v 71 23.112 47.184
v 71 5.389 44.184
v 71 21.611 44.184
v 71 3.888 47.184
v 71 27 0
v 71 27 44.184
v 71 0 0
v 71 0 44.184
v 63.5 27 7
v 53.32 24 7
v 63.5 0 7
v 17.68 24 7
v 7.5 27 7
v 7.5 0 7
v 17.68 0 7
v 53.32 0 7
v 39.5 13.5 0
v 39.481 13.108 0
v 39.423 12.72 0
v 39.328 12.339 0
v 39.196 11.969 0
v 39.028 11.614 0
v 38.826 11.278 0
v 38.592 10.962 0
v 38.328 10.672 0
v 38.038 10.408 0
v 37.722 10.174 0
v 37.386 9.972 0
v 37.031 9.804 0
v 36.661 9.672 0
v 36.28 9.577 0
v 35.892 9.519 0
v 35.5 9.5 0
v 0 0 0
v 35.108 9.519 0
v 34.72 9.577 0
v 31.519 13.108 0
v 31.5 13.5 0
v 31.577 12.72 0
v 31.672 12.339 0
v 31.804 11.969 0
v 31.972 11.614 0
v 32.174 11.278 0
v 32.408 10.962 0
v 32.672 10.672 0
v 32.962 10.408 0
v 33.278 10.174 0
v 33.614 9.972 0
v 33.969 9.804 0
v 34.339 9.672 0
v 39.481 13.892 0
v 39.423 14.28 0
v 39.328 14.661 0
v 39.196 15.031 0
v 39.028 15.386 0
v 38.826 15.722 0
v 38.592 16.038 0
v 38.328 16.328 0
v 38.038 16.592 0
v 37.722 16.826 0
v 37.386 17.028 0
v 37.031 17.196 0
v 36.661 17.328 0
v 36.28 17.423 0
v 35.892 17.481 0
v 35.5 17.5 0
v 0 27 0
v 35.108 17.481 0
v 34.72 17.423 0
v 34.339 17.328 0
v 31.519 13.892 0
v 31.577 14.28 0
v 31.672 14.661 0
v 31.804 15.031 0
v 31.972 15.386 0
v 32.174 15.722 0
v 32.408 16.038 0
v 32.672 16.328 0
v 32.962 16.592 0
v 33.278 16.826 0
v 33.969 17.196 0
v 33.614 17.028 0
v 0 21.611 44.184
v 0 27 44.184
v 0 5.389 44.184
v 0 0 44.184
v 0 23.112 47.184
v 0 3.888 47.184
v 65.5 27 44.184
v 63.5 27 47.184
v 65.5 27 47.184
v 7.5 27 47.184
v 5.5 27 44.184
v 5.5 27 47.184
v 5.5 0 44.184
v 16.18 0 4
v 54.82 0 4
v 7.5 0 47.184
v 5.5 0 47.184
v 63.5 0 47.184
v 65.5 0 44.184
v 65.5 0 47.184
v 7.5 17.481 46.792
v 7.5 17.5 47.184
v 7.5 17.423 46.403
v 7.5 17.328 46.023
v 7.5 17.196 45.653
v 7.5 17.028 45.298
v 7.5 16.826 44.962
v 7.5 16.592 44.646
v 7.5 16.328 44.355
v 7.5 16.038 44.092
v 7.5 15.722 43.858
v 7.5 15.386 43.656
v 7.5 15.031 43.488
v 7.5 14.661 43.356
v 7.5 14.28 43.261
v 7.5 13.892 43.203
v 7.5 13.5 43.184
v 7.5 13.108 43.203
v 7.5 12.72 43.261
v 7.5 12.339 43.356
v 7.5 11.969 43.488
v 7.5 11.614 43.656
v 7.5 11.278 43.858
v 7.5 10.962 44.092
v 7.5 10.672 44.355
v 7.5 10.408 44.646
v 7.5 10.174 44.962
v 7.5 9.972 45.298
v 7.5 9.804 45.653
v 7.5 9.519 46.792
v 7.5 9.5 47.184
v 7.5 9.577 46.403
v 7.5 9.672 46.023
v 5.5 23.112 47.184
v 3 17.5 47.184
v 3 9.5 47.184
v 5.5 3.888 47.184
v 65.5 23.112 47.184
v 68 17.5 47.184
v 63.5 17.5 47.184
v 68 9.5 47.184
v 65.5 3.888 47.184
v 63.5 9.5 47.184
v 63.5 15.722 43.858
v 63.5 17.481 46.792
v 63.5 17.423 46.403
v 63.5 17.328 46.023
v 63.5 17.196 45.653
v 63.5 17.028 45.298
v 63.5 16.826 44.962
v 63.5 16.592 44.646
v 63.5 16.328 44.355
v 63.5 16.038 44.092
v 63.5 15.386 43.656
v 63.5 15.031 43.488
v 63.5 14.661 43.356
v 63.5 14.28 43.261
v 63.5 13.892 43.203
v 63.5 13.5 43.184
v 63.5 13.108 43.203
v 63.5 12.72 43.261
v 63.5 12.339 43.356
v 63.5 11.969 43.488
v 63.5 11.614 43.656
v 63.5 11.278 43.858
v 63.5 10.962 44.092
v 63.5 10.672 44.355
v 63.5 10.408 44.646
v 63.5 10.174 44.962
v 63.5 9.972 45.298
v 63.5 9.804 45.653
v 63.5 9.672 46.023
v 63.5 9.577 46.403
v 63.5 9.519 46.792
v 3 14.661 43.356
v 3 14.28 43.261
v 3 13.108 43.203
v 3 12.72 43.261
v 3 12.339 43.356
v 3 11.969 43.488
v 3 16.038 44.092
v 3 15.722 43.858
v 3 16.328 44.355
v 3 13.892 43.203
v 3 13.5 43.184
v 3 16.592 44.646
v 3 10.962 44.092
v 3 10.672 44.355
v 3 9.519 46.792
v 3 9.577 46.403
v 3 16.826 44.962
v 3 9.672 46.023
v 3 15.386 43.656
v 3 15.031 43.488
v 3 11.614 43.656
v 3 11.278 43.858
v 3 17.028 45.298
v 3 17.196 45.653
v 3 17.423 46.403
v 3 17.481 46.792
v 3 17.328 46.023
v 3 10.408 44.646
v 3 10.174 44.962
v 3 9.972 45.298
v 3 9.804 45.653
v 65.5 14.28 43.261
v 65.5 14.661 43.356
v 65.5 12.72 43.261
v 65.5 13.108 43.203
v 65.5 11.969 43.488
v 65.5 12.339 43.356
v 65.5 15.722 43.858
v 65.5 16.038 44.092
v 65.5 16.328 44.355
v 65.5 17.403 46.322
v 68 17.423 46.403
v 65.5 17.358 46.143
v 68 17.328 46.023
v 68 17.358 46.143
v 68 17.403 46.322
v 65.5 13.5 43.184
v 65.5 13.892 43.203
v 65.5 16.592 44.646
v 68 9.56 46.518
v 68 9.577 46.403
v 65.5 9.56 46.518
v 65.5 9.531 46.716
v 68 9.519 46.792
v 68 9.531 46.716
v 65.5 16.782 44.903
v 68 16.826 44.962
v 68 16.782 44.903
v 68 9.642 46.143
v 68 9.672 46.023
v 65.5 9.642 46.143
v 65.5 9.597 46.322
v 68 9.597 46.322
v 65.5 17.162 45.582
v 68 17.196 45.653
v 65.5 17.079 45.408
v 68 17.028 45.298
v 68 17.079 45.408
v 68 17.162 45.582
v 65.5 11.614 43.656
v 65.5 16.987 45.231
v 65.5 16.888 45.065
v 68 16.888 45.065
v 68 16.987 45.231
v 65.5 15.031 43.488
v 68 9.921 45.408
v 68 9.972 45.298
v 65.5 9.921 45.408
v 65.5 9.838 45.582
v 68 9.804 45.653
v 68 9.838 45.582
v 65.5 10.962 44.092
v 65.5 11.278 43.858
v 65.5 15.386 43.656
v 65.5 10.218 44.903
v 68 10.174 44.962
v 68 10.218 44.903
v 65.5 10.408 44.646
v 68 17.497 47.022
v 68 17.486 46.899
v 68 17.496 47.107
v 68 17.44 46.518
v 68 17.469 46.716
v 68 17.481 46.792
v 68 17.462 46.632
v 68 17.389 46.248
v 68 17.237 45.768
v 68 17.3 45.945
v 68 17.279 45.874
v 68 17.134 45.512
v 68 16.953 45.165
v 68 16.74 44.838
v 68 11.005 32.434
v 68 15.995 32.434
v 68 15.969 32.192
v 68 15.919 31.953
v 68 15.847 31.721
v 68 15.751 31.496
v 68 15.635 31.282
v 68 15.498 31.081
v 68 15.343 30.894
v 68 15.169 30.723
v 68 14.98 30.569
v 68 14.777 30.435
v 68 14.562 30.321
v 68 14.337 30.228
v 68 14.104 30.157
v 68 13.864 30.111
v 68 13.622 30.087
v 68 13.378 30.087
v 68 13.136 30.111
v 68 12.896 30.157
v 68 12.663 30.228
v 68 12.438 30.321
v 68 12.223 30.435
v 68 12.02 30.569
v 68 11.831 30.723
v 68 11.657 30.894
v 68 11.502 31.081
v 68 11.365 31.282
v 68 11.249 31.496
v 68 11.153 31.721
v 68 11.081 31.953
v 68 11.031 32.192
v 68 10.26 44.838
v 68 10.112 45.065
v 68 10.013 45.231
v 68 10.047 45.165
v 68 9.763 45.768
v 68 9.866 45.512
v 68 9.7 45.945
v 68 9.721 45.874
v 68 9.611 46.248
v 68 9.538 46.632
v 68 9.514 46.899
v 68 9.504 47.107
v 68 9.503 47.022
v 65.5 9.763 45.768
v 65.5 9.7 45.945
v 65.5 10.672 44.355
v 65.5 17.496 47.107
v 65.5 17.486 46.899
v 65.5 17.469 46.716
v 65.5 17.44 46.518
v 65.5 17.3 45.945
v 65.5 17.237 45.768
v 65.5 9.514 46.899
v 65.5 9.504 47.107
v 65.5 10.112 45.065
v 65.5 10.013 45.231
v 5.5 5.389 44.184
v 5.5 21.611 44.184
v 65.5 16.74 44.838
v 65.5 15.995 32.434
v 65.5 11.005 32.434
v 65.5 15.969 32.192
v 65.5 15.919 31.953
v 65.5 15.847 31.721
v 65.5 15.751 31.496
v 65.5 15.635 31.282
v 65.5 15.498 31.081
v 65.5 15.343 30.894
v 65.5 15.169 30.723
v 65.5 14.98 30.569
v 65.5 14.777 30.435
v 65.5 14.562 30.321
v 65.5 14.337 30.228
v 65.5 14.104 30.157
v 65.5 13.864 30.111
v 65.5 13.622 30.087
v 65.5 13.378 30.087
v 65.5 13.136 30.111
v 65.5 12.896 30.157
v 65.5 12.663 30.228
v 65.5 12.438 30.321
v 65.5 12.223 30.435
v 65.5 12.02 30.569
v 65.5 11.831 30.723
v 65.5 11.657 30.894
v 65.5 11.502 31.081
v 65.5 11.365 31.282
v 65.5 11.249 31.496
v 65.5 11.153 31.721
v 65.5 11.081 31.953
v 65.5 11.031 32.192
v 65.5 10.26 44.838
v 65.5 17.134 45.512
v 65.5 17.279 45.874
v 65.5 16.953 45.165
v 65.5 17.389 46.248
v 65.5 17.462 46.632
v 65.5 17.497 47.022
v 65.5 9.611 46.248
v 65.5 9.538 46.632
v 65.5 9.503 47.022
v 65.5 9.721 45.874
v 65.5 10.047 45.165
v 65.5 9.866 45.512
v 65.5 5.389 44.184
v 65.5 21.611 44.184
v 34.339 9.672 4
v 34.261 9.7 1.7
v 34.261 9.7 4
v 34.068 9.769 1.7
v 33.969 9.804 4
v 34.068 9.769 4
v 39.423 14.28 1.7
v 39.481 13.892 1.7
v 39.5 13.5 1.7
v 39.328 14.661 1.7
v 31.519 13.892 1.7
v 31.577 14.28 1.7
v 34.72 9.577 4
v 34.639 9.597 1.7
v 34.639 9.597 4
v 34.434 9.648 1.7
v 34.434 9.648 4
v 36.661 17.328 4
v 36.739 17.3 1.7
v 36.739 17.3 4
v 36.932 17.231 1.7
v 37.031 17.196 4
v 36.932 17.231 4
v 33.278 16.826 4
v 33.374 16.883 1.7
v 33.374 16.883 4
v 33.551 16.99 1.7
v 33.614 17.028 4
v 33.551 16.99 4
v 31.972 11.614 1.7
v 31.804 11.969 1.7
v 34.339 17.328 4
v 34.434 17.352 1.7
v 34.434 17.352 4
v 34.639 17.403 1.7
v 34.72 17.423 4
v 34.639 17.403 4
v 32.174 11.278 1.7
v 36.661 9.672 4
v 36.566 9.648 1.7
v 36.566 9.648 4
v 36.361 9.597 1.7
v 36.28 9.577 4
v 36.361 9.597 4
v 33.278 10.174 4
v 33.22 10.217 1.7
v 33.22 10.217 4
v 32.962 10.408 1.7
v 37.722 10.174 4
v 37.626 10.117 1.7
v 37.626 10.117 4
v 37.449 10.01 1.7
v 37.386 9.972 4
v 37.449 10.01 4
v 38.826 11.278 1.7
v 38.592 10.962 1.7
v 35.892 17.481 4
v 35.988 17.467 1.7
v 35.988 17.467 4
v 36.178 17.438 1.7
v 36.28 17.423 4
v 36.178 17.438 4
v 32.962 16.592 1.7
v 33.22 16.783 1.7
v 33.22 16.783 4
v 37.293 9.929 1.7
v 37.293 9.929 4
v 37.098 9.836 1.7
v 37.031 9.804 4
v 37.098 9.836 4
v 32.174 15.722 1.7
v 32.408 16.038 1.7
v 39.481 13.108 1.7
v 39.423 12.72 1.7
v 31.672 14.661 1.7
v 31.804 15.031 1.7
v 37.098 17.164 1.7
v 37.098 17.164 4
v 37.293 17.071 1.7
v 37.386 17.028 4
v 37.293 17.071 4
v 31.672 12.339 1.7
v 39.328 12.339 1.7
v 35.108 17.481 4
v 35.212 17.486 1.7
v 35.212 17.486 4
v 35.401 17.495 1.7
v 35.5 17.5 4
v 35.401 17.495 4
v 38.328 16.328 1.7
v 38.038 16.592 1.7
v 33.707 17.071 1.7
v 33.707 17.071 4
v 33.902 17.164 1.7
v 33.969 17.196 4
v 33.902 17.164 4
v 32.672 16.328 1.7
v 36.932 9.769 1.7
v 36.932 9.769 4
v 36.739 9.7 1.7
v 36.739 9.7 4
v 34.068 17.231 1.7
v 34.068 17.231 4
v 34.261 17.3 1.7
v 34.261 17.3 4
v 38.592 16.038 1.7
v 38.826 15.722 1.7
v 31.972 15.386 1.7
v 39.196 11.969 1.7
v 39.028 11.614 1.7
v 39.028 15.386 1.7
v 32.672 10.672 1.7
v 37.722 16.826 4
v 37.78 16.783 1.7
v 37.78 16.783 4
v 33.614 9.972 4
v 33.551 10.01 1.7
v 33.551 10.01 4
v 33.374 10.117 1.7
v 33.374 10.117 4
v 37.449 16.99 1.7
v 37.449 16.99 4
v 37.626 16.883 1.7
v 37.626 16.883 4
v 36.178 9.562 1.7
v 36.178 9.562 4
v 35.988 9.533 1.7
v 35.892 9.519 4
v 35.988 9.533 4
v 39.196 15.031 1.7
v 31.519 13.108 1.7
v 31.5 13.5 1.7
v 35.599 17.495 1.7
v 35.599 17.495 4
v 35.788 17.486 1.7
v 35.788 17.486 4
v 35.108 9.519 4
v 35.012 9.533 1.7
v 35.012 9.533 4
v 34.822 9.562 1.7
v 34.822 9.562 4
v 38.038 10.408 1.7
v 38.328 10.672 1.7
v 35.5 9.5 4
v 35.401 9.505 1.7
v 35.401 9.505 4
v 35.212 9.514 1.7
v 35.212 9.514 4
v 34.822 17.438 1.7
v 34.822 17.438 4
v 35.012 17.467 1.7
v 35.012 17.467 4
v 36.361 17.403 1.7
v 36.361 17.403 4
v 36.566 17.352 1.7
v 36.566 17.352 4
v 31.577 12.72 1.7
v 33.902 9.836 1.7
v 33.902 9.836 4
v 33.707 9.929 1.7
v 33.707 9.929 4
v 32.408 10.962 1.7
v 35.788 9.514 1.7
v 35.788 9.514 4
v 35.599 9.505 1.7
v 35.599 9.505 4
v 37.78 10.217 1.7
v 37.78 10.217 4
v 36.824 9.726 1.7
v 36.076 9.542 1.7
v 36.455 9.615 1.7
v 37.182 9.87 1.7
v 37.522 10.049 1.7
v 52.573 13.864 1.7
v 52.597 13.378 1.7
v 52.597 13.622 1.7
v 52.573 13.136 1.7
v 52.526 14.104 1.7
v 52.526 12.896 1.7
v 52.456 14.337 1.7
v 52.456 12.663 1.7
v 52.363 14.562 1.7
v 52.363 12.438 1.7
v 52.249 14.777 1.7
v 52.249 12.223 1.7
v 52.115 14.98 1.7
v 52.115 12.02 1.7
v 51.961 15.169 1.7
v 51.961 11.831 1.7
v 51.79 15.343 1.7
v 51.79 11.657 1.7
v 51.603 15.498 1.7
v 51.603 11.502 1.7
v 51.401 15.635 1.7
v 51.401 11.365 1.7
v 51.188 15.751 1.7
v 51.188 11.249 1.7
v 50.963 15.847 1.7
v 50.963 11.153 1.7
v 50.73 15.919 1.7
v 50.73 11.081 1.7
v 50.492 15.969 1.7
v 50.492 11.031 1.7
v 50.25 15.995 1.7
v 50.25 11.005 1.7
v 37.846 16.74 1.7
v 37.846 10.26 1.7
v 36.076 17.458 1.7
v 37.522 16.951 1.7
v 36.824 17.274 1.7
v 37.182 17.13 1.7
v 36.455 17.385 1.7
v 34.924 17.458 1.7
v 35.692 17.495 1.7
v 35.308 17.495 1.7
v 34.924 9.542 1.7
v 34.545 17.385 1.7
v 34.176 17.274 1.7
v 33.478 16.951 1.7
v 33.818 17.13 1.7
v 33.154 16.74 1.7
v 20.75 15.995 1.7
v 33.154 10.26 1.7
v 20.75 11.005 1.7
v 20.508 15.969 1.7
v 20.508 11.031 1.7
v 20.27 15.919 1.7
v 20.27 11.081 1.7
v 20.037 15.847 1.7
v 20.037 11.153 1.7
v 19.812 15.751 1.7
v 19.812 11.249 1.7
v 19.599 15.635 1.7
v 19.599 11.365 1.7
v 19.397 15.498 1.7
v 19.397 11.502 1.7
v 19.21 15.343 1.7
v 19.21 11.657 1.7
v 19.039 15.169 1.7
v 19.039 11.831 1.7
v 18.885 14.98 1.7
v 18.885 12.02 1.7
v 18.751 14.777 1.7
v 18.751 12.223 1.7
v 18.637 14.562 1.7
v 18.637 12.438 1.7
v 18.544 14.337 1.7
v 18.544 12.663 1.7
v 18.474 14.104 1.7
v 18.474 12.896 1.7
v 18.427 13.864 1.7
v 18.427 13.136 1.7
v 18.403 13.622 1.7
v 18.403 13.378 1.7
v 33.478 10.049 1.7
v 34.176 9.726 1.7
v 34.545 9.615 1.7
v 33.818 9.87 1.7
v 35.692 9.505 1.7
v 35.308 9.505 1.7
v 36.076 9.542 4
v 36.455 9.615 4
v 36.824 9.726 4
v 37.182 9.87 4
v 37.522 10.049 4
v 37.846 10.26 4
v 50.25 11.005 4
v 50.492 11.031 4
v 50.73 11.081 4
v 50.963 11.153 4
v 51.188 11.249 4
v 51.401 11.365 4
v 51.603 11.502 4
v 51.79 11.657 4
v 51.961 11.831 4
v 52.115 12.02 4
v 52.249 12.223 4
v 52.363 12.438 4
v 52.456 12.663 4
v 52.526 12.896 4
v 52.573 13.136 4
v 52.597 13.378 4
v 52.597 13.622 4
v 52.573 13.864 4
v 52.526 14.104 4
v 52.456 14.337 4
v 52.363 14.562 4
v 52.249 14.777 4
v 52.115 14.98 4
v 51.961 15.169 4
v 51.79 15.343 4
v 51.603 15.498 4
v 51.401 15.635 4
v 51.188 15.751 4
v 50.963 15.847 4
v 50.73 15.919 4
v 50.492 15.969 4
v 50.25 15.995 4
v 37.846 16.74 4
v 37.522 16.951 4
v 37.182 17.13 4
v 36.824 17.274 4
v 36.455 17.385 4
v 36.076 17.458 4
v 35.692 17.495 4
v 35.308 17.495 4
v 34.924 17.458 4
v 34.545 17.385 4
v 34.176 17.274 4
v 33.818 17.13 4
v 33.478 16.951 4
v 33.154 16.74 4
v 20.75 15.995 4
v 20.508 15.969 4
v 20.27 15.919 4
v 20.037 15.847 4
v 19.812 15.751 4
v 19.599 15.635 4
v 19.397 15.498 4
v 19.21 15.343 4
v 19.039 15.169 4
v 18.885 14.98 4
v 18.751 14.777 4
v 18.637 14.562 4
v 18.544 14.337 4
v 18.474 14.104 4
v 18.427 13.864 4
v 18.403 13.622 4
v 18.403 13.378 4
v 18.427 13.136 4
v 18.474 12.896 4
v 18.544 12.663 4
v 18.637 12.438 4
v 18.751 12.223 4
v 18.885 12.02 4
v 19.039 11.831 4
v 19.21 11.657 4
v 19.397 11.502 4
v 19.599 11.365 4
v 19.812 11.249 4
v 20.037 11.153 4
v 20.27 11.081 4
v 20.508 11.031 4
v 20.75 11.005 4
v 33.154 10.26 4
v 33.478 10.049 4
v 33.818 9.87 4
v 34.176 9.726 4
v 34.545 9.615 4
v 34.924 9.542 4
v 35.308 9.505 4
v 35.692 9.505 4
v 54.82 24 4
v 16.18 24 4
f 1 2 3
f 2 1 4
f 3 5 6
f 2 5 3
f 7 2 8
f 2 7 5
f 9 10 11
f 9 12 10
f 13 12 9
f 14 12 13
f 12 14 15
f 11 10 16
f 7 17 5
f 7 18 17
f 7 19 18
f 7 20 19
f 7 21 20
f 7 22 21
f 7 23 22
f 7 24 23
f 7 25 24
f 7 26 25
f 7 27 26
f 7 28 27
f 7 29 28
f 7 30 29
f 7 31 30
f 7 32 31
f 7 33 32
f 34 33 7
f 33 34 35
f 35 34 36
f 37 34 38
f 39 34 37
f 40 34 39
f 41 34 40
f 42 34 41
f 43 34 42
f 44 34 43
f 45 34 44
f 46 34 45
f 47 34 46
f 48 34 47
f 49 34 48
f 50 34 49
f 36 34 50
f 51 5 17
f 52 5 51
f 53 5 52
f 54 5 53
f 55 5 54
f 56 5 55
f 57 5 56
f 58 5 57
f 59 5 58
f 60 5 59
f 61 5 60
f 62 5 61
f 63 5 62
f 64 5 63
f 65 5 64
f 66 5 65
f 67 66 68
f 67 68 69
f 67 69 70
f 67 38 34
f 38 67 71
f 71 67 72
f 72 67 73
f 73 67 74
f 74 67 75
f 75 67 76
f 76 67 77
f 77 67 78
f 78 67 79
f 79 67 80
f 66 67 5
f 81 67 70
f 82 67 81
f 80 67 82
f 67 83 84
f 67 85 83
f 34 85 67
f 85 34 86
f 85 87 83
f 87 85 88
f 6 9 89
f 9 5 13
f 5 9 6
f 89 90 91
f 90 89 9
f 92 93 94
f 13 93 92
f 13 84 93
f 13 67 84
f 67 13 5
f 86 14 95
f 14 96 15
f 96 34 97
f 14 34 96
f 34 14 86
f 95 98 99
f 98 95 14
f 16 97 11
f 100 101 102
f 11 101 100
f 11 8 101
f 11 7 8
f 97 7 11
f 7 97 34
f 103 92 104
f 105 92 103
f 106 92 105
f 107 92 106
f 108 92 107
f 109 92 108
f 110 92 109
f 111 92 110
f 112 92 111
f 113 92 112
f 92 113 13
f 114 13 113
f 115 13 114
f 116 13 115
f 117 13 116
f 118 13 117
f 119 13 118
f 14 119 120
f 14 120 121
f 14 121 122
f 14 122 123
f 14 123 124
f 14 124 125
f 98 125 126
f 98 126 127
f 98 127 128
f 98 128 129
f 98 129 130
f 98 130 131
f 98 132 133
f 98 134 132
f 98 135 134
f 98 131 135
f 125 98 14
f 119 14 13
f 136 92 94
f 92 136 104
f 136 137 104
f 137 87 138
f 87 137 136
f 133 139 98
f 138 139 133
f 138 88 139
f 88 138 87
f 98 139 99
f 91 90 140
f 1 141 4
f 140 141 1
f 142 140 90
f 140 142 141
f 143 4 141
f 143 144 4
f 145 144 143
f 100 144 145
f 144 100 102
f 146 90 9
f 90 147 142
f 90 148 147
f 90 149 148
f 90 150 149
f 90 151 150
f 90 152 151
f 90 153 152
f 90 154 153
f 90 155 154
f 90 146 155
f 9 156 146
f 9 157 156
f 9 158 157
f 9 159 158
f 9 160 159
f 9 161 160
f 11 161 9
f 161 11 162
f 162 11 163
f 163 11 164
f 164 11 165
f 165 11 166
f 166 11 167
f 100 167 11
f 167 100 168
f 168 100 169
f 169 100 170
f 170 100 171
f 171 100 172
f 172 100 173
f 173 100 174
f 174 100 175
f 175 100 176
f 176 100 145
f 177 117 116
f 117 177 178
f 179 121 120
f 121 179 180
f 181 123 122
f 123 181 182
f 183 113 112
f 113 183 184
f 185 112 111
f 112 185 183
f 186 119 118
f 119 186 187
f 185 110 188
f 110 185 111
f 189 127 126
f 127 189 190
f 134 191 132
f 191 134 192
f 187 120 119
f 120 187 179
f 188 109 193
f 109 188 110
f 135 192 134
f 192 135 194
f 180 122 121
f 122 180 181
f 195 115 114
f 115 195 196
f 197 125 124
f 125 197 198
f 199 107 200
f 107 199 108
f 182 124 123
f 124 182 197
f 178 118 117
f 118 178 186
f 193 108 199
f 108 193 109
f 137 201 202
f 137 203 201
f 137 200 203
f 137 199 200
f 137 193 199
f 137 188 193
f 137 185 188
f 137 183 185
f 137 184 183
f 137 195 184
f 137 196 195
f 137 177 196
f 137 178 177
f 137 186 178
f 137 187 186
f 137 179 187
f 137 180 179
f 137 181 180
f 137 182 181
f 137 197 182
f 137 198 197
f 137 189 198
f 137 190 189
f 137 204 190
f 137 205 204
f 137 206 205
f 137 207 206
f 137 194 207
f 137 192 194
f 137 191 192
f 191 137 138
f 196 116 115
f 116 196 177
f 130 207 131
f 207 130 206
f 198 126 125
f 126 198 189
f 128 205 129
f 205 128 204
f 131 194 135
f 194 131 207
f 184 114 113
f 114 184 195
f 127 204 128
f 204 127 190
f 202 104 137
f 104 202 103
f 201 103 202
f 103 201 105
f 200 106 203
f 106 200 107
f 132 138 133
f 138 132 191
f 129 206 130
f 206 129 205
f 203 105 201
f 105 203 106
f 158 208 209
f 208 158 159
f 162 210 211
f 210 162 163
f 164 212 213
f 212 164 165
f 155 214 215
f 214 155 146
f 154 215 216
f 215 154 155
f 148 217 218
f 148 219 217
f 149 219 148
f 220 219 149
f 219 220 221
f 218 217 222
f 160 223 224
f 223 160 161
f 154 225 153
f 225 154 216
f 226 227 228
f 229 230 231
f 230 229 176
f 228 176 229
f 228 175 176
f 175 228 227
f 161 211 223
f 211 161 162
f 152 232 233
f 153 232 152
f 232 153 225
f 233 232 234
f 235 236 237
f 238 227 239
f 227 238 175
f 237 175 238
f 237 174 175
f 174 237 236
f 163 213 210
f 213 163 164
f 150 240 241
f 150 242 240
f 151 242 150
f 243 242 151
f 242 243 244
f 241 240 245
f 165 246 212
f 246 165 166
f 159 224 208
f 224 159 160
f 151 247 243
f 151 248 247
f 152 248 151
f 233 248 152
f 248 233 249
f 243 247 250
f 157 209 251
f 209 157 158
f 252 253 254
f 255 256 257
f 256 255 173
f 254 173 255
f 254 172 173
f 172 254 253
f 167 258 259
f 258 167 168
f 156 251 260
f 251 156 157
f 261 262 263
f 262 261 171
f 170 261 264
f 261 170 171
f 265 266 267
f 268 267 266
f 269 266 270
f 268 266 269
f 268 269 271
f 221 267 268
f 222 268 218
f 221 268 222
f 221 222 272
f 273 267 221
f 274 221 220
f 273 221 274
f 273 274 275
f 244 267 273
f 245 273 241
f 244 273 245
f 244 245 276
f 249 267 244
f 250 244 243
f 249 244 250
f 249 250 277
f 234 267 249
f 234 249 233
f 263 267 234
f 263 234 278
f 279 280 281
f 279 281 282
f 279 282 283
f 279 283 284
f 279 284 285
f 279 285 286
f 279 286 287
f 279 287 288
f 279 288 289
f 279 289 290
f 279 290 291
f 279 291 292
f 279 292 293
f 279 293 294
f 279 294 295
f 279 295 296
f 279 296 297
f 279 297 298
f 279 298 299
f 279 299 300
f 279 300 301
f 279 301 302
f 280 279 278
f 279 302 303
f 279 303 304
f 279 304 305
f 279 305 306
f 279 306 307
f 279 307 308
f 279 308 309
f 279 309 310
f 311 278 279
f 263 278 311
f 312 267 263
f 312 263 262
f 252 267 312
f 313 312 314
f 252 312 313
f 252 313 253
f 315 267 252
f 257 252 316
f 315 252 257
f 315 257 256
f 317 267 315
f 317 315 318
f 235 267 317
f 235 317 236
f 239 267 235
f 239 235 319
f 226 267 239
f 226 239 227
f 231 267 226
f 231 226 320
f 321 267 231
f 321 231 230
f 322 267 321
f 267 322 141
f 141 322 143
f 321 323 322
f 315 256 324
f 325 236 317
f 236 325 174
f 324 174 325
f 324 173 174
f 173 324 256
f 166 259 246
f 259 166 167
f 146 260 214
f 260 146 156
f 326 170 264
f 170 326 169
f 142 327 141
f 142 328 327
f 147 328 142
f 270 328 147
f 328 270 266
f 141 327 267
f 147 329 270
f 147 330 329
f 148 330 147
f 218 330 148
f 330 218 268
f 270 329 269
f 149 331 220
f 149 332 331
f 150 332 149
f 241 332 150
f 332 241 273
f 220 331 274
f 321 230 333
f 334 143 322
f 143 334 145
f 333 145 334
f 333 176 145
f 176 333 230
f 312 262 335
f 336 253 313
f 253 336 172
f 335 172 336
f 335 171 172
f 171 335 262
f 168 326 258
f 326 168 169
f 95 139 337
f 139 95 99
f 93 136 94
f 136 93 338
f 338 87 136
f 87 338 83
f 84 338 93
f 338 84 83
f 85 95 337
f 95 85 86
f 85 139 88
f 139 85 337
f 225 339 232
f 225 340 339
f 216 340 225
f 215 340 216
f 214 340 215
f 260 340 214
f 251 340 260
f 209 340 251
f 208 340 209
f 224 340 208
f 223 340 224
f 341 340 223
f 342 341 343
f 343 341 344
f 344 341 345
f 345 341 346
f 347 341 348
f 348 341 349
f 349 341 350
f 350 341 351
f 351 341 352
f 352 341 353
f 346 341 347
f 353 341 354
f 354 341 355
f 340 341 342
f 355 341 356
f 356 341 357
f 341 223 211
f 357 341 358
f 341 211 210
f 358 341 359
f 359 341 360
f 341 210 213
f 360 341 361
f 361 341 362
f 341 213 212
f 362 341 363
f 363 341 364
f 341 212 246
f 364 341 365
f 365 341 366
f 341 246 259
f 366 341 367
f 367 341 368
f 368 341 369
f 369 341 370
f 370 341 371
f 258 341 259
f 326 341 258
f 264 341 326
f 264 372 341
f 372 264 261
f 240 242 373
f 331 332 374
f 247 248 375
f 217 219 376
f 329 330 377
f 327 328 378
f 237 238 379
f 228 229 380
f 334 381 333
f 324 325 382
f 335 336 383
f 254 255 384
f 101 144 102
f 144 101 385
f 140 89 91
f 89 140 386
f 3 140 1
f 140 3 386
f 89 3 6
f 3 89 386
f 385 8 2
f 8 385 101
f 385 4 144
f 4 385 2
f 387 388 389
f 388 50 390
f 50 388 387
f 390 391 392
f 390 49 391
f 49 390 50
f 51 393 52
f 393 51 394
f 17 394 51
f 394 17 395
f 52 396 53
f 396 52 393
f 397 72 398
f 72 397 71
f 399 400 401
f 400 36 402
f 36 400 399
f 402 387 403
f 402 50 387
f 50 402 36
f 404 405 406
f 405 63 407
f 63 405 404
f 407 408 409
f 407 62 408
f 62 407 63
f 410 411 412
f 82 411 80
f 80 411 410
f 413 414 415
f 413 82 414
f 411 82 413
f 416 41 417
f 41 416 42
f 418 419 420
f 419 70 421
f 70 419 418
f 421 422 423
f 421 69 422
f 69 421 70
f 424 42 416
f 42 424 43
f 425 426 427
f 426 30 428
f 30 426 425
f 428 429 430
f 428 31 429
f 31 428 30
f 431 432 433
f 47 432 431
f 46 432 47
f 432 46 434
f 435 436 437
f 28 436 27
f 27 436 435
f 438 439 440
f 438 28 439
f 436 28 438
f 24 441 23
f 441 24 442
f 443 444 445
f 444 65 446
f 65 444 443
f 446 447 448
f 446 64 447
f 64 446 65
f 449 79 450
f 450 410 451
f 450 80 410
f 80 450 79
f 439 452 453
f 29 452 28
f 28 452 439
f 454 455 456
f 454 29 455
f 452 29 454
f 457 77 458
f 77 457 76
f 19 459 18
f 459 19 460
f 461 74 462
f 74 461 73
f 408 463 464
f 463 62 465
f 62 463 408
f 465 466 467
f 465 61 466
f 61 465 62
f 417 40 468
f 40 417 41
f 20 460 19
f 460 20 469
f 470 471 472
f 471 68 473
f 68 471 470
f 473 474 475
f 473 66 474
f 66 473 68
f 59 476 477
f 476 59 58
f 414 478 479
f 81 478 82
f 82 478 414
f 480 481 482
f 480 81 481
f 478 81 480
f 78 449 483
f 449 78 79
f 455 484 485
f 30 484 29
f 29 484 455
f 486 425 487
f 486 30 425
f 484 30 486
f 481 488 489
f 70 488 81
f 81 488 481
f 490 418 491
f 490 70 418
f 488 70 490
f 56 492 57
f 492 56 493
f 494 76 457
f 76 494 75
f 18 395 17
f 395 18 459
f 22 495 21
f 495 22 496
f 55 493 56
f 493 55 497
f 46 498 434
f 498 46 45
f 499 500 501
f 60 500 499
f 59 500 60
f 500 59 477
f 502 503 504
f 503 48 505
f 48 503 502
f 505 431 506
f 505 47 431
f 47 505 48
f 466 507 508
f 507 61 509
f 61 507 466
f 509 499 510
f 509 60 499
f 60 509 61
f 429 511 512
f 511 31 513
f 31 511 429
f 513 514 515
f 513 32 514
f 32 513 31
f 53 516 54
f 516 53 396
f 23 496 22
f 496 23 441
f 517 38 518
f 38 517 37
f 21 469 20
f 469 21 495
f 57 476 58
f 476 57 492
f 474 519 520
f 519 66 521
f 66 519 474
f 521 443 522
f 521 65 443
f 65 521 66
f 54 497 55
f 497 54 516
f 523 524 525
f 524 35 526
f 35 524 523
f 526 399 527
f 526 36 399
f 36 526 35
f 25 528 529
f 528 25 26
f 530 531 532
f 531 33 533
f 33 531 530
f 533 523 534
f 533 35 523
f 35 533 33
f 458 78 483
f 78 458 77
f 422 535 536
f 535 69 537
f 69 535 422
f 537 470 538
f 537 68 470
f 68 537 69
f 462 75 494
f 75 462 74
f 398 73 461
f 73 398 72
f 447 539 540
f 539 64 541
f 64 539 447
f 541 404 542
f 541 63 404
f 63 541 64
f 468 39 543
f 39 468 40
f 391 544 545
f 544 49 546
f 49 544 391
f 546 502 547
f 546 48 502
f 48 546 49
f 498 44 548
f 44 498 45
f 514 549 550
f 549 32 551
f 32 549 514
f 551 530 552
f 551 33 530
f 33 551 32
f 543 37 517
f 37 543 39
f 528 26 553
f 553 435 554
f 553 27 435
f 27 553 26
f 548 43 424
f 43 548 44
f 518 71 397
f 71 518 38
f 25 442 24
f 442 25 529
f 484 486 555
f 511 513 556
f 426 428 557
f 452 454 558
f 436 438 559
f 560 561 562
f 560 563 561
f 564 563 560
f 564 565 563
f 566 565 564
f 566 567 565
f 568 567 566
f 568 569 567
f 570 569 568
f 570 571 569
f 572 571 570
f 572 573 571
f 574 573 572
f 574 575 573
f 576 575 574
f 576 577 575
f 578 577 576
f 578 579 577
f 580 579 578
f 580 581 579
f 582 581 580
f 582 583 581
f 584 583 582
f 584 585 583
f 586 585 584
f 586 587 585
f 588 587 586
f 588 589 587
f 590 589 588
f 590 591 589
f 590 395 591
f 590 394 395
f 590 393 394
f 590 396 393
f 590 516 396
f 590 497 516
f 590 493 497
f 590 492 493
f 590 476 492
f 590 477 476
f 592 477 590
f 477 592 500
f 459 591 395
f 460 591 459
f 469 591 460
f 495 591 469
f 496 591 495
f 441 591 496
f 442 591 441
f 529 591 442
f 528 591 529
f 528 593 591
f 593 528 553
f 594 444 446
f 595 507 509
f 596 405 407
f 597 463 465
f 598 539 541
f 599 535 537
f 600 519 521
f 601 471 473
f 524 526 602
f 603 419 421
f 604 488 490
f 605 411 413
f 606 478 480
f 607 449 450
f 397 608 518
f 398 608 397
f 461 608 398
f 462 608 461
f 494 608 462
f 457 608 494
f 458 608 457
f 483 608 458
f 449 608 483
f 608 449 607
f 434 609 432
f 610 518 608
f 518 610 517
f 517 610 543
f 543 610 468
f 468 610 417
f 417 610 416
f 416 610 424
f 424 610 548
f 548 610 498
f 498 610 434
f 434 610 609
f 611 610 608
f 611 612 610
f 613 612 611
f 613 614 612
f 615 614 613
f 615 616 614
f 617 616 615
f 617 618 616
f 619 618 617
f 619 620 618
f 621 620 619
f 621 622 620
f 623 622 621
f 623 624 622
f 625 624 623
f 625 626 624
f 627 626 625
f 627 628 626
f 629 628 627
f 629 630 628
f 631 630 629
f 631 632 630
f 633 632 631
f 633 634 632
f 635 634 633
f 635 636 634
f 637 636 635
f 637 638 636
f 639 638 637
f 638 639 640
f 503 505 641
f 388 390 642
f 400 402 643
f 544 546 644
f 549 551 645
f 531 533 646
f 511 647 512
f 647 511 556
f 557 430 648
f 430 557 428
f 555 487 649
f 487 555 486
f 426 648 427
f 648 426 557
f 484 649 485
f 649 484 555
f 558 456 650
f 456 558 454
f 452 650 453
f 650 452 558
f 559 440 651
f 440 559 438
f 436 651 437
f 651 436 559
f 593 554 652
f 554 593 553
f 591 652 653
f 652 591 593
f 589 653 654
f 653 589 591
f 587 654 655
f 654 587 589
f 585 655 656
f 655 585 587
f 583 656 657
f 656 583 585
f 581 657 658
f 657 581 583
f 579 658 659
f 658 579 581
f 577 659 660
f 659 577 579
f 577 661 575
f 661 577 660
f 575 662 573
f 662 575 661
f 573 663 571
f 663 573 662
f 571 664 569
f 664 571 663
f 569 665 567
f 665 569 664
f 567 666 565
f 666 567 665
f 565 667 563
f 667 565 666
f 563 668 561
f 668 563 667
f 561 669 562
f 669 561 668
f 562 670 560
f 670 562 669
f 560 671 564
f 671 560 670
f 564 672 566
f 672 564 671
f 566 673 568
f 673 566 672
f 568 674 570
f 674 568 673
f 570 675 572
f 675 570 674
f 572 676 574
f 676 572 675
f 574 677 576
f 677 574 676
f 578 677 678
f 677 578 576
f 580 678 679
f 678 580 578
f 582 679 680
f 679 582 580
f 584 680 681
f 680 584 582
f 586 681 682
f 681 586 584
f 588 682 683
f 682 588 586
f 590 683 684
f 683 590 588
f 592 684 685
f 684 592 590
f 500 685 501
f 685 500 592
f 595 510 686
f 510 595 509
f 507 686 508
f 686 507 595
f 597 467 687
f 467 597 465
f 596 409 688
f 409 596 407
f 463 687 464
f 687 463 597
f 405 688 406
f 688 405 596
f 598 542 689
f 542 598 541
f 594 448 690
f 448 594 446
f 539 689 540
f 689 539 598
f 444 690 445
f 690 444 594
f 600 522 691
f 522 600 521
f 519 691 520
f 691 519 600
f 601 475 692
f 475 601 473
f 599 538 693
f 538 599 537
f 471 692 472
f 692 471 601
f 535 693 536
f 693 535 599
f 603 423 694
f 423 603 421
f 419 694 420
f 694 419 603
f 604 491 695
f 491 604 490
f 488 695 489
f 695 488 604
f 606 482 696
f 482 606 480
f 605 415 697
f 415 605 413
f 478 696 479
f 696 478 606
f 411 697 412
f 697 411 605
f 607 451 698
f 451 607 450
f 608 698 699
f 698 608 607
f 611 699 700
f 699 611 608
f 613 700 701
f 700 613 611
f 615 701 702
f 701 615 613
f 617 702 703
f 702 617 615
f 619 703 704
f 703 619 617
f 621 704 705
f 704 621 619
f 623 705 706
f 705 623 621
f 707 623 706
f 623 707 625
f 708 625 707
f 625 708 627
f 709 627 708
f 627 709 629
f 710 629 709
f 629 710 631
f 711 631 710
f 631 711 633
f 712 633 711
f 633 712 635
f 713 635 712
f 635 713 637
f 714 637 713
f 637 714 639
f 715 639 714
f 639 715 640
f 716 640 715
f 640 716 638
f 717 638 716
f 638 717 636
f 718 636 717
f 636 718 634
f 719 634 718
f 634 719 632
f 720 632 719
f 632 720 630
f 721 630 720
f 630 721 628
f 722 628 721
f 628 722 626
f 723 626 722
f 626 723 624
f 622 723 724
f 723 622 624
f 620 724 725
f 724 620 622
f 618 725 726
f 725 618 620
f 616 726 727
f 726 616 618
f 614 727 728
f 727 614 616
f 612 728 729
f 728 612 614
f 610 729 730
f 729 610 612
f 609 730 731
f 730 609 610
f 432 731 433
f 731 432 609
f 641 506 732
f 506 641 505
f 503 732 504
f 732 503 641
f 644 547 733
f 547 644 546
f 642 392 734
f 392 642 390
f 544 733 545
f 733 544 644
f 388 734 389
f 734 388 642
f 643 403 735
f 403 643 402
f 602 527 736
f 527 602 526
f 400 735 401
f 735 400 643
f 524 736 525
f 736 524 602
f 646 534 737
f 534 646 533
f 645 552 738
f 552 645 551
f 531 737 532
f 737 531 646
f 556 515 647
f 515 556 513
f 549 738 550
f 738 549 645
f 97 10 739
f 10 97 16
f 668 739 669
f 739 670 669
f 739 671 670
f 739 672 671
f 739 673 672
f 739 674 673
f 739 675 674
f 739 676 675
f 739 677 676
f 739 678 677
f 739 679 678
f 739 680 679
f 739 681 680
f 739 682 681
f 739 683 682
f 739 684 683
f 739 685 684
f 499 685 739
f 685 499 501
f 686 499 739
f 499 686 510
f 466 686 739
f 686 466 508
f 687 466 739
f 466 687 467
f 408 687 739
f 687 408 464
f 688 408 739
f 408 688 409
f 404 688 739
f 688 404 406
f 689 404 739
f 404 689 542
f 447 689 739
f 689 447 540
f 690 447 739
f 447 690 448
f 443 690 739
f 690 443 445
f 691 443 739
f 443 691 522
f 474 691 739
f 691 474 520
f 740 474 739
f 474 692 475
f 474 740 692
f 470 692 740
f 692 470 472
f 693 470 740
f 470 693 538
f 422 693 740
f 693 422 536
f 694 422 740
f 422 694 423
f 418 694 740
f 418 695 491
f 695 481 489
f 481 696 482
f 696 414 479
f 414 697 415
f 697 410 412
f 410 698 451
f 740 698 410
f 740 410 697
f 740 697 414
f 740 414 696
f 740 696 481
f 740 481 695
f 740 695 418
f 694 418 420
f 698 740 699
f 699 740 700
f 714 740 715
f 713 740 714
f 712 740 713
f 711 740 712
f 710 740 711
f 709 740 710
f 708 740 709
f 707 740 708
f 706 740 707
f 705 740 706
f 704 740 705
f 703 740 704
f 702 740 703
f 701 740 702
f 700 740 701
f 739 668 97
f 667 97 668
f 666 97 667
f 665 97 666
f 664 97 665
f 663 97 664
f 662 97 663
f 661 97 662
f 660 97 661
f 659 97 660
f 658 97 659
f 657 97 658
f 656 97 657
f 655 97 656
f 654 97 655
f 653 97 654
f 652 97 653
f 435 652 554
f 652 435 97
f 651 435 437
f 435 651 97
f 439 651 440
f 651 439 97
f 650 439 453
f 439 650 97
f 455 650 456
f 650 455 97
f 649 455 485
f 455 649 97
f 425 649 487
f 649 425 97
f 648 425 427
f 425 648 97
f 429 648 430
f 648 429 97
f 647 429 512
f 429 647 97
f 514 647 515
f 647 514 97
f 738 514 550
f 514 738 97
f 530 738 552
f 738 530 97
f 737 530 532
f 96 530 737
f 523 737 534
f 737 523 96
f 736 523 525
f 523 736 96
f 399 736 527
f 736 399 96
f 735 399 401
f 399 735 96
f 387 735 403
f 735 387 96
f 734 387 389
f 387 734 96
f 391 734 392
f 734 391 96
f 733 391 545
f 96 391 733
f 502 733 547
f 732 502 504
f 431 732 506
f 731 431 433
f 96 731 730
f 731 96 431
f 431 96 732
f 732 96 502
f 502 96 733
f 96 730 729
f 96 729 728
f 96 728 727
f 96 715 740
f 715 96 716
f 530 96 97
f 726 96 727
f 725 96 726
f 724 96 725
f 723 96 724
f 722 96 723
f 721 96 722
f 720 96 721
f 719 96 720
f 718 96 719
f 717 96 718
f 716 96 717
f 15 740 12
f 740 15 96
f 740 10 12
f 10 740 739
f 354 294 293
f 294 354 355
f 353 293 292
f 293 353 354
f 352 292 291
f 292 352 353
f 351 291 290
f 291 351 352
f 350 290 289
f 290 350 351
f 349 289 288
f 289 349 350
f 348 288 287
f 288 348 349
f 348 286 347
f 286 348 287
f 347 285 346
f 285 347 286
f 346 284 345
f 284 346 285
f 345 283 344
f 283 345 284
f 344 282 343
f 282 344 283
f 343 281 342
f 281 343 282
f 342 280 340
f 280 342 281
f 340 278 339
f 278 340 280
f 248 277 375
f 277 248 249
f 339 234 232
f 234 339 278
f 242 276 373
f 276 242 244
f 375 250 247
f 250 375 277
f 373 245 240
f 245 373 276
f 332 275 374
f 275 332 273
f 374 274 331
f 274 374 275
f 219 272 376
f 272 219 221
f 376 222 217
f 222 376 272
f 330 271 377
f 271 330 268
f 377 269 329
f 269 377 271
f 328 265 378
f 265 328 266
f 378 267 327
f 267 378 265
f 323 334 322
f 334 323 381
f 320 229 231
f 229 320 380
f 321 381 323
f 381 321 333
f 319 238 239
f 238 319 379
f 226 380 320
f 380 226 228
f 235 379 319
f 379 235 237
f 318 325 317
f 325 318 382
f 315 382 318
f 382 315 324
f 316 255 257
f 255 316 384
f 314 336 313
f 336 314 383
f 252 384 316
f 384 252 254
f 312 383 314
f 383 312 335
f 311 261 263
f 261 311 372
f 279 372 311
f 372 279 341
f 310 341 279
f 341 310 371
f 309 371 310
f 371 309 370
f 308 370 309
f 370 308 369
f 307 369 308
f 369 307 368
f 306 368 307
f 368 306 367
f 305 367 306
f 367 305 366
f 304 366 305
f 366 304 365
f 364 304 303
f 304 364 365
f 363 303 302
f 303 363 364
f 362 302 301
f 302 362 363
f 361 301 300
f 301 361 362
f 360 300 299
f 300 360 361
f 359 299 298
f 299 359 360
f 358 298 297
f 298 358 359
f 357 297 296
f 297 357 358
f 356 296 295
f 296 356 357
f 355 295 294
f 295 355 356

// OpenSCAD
BASE_X = 71;
BASE_Y = 27;
BASE_Z = 7;

WALL_X = 7.5;
WALL_Y = BASE_Y;
WALL_Z = 47.1838;

AXIS_H = 4.5;
AXIS_R = 4;
MARGIN = 1;
FN = 64;

SLOT_H = 3;
HOLE3_H = 2.5;

difference () {
union () {
    // Base
    cube([BASE_X, BASE_Y, BASE_Z]);
    
    // Walls
    cube([WALL_X, WALL_Y, WALL_Z]);
    translate ([BASE_X - WALL_X, 0, 0]) {
        cube([WALL_X, WALL_Y, WALL_Z]);
    }
}
union () {
    // Axis holes
    translate ([WALL_X - AXIS_H, WALL_Y / 2.0, WALL_Z]) {
    rotate ([0, 90, 0]) {
        cylinder (AXIS_H + MARGIN, AXIS_R, AXIS_R, $fn=FN);
    }
    }
    translate ([BASE_X - WALL_X - MARGIN, WALL_Y / 2.0, WALL_Z]) {
    rotate ([0, 90, 0]) {
        cylinder (AXIS_H + MARGIN, AXIS_R, AXIS_R, $fn=FN);
    }
    }
    
    // Slot
    translate ([-2 * MARGIN, WALL_Y / 2.0, WALL_Z - SLOT_H]) {
    rotate ([0, 0, 90]) {
    rotate ([90, 0, 0]) {
    translate ([0, SLOT_H, 0]) {
    linear_extrude(height = WALL_X) {
        import(file = "../drawings/camera.dxf", layer = "openscad-top1", $fn=FN);
    }
    }
    }
    }
    }
    
    translate ([BASE_X - WALL_X + 2 * MARGIN, WALL_Y / 2.0, WALL_Z - SLOT_H]) {
    rotate ([0, 0, 90]) {
    rotate ([90, 0, 0]) {
    translate ([0, SLOT_H, 0]) {
    linear_extrude(height = WALL_X) {
        import(file = "../drawings/camera.dxf", layer = "openscad-top1", $fn=FN);
    }
    }
    }
    }
    }
    
    // Servo hole
    translate ([BASE_X / 2.0, BASE_Y / 2.0, -MARGIN]) {
    cylinder (BASE_Z + 2 * MARGIN, AXIS_R, AXIS_R, $fn=FN);
    }
    translate ([BASE_X / 2.0, BASE_Y / 2.0, 1.7]) {
    linear_extrude(height = BASE_Z) {
        import(file = "../drawings/camera.dxf", layer = "openscad-servo-hole2", $fn=FN);
    }
    }
    
    // Base hole
    translate ([BASE_X / 2.0, BASE_Y - 3, 4]) {
    rotate ([90, 0, 0]) {
        linear_extrude(height = BASE_Y) {
            import(file = "../drawings/camera.dxf", layer = "openscad-base-hole", $fn=FN);
        }
    }
    }
    
    // Long servo hole
    translate ([BASE_X - 5.5, WALL_Y / 2.0, WALL_Z]) {
    rotate ([0, 0, 90]) {
        rotate ([90, 0, 0]) {
            linear_extrude(height = HOLE3_H) {
                import(file = "../drawings/camera.dxf", layer = "openscad-servo-hole3", $fn=FN);
                }
            }
        }
    }
}
}
